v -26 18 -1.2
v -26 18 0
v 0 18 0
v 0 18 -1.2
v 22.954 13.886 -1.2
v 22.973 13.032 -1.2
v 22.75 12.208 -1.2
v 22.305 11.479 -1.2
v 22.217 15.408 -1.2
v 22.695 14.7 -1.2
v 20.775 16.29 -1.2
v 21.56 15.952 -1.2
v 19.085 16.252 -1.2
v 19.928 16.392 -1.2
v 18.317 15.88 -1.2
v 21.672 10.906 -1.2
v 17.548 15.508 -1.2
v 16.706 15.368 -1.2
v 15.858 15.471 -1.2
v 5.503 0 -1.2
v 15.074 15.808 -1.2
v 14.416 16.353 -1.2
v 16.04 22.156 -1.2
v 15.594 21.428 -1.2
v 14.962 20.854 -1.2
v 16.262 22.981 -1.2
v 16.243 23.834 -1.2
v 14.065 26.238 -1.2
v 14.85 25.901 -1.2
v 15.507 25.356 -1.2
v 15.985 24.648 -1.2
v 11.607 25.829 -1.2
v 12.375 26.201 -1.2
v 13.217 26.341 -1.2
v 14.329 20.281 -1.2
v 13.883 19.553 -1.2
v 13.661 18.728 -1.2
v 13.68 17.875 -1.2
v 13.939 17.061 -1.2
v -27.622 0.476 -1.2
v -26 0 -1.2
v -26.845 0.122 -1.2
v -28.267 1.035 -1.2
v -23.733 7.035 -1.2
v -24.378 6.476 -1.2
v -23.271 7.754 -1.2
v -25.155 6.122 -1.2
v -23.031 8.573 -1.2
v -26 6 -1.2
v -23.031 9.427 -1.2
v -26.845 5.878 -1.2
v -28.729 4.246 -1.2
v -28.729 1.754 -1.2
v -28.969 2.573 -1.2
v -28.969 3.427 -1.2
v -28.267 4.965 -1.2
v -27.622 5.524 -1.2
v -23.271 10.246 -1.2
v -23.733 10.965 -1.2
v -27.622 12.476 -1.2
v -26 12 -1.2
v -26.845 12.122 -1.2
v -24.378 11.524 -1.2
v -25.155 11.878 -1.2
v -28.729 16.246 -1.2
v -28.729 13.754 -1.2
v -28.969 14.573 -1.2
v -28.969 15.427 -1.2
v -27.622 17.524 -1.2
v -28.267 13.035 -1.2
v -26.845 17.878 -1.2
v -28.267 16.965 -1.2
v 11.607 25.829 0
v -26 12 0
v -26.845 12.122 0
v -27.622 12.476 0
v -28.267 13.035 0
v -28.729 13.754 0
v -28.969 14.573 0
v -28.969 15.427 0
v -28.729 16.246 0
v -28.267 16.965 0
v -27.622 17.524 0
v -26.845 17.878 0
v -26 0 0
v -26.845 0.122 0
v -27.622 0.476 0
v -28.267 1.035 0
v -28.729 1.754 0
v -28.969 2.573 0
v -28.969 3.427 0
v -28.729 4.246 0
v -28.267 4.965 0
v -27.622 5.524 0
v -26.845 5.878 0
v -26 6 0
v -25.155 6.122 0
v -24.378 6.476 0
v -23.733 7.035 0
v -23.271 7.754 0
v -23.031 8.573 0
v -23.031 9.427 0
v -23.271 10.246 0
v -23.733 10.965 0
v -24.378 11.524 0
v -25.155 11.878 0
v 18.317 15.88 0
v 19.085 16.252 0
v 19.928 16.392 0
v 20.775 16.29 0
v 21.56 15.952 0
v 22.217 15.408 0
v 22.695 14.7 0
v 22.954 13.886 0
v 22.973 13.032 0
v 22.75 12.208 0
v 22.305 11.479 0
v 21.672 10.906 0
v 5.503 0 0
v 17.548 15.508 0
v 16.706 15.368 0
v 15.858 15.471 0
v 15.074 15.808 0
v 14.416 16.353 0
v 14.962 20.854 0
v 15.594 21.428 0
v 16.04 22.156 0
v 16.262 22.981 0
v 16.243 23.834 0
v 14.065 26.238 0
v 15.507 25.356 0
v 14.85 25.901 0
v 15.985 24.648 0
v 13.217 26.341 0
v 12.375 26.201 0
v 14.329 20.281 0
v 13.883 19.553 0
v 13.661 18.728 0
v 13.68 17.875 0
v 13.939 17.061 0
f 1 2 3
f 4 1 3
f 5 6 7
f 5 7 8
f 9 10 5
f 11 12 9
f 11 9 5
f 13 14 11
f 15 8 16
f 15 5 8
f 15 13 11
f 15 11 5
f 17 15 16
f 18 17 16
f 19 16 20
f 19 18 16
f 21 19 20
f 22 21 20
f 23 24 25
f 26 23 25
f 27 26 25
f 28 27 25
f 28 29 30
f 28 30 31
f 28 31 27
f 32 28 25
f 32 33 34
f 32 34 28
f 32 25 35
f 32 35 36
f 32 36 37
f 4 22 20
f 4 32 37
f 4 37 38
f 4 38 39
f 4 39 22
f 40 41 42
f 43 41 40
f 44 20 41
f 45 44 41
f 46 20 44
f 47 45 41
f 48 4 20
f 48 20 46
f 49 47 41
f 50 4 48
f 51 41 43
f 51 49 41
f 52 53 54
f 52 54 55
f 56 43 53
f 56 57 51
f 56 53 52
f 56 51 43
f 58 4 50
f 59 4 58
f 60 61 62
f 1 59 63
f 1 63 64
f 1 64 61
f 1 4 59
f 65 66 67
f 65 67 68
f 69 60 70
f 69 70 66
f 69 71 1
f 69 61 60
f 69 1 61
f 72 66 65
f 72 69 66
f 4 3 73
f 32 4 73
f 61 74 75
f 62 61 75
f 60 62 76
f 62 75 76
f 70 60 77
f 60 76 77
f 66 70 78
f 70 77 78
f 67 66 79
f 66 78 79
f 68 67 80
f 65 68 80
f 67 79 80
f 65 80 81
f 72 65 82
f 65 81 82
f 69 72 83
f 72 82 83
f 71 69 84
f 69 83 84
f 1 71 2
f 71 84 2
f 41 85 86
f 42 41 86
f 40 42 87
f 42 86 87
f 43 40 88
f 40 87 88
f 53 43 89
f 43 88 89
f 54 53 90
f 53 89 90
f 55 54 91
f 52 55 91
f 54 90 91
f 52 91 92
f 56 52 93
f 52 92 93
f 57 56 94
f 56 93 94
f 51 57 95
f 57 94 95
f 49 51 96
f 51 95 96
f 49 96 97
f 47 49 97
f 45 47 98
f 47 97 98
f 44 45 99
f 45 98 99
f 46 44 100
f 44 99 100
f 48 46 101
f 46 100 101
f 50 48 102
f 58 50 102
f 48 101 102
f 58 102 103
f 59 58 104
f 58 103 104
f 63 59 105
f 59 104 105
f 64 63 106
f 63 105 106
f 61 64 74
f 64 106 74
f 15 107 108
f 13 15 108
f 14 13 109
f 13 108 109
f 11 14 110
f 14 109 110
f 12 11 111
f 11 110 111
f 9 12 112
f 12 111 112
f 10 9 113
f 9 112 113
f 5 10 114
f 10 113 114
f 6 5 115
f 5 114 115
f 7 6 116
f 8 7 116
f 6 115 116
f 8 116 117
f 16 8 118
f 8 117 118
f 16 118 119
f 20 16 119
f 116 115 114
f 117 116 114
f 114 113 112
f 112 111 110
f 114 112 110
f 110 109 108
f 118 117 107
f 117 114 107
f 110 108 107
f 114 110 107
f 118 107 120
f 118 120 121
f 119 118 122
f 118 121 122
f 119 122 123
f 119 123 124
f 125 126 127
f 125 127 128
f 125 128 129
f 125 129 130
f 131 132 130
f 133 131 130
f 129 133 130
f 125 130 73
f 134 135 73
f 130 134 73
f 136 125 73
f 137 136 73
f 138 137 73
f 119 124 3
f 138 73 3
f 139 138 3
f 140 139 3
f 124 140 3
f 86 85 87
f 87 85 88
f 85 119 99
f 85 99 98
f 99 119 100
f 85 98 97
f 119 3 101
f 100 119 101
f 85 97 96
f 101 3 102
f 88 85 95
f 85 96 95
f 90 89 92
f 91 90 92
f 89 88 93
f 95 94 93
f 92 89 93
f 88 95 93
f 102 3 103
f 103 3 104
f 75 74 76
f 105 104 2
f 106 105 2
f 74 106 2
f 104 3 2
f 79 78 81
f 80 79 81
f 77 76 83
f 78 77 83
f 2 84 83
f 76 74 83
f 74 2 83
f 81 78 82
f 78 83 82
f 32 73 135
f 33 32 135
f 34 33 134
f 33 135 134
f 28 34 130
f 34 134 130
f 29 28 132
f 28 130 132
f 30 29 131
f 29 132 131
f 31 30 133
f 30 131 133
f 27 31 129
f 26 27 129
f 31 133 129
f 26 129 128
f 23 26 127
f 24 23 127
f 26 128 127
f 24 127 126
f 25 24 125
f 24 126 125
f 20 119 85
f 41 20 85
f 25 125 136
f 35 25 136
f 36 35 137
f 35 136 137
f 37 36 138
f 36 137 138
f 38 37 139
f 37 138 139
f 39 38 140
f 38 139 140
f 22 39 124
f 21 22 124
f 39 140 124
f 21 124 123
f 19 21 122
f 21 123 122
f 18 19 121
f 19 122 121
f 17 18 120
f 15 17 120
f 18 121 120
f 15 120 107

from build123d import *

# Parameters (mm, degrees)
SM_BASE_FLANGE_1_DEPTH = 1.2


# Sheet-metal steps are written as plain solids
with BuildPart() as part:
    # Sketch 1 → 基体-法兰1 (new body)
    with BuildSketch(Plane.XY):
        with BuildLine():
            Line((0, 0), (-26, 0))
            ThreePointArc((-26, 0), (-29, 3), (-26, 6))
            ThreePointArc((-26, 6), (-23, 9), (-26, 12))
            ThreePointArc((-26, 12), (-29, 15), (-26, 18))
            Line((-26, 18), (0, 18))
            Line((0, 18), (11.606526016, 25.828700649))
            ThreePointArc((11.606526016, 25.828700649), (15.771217444, 25.019166641), (14.961683437, 20.854475213))
            ThreePointArc((14.961683437, 20.854475213), (14.152149429, 16.689783785), (18.316840857, 15.880249778))
            ThreePointArc((18.316840857, 15.880249778), (22.481532285, 15.070715771), (21.671998278, 10.906024343))
            Line((21.671998278, 10.906024343), (5.503152266, 0))
            Line((5.503152266, 0), (0, 0))
        make_face()
    extrude(amount=-SM_BASE_FLANGE_1_DEPTH)


solid = part.part
